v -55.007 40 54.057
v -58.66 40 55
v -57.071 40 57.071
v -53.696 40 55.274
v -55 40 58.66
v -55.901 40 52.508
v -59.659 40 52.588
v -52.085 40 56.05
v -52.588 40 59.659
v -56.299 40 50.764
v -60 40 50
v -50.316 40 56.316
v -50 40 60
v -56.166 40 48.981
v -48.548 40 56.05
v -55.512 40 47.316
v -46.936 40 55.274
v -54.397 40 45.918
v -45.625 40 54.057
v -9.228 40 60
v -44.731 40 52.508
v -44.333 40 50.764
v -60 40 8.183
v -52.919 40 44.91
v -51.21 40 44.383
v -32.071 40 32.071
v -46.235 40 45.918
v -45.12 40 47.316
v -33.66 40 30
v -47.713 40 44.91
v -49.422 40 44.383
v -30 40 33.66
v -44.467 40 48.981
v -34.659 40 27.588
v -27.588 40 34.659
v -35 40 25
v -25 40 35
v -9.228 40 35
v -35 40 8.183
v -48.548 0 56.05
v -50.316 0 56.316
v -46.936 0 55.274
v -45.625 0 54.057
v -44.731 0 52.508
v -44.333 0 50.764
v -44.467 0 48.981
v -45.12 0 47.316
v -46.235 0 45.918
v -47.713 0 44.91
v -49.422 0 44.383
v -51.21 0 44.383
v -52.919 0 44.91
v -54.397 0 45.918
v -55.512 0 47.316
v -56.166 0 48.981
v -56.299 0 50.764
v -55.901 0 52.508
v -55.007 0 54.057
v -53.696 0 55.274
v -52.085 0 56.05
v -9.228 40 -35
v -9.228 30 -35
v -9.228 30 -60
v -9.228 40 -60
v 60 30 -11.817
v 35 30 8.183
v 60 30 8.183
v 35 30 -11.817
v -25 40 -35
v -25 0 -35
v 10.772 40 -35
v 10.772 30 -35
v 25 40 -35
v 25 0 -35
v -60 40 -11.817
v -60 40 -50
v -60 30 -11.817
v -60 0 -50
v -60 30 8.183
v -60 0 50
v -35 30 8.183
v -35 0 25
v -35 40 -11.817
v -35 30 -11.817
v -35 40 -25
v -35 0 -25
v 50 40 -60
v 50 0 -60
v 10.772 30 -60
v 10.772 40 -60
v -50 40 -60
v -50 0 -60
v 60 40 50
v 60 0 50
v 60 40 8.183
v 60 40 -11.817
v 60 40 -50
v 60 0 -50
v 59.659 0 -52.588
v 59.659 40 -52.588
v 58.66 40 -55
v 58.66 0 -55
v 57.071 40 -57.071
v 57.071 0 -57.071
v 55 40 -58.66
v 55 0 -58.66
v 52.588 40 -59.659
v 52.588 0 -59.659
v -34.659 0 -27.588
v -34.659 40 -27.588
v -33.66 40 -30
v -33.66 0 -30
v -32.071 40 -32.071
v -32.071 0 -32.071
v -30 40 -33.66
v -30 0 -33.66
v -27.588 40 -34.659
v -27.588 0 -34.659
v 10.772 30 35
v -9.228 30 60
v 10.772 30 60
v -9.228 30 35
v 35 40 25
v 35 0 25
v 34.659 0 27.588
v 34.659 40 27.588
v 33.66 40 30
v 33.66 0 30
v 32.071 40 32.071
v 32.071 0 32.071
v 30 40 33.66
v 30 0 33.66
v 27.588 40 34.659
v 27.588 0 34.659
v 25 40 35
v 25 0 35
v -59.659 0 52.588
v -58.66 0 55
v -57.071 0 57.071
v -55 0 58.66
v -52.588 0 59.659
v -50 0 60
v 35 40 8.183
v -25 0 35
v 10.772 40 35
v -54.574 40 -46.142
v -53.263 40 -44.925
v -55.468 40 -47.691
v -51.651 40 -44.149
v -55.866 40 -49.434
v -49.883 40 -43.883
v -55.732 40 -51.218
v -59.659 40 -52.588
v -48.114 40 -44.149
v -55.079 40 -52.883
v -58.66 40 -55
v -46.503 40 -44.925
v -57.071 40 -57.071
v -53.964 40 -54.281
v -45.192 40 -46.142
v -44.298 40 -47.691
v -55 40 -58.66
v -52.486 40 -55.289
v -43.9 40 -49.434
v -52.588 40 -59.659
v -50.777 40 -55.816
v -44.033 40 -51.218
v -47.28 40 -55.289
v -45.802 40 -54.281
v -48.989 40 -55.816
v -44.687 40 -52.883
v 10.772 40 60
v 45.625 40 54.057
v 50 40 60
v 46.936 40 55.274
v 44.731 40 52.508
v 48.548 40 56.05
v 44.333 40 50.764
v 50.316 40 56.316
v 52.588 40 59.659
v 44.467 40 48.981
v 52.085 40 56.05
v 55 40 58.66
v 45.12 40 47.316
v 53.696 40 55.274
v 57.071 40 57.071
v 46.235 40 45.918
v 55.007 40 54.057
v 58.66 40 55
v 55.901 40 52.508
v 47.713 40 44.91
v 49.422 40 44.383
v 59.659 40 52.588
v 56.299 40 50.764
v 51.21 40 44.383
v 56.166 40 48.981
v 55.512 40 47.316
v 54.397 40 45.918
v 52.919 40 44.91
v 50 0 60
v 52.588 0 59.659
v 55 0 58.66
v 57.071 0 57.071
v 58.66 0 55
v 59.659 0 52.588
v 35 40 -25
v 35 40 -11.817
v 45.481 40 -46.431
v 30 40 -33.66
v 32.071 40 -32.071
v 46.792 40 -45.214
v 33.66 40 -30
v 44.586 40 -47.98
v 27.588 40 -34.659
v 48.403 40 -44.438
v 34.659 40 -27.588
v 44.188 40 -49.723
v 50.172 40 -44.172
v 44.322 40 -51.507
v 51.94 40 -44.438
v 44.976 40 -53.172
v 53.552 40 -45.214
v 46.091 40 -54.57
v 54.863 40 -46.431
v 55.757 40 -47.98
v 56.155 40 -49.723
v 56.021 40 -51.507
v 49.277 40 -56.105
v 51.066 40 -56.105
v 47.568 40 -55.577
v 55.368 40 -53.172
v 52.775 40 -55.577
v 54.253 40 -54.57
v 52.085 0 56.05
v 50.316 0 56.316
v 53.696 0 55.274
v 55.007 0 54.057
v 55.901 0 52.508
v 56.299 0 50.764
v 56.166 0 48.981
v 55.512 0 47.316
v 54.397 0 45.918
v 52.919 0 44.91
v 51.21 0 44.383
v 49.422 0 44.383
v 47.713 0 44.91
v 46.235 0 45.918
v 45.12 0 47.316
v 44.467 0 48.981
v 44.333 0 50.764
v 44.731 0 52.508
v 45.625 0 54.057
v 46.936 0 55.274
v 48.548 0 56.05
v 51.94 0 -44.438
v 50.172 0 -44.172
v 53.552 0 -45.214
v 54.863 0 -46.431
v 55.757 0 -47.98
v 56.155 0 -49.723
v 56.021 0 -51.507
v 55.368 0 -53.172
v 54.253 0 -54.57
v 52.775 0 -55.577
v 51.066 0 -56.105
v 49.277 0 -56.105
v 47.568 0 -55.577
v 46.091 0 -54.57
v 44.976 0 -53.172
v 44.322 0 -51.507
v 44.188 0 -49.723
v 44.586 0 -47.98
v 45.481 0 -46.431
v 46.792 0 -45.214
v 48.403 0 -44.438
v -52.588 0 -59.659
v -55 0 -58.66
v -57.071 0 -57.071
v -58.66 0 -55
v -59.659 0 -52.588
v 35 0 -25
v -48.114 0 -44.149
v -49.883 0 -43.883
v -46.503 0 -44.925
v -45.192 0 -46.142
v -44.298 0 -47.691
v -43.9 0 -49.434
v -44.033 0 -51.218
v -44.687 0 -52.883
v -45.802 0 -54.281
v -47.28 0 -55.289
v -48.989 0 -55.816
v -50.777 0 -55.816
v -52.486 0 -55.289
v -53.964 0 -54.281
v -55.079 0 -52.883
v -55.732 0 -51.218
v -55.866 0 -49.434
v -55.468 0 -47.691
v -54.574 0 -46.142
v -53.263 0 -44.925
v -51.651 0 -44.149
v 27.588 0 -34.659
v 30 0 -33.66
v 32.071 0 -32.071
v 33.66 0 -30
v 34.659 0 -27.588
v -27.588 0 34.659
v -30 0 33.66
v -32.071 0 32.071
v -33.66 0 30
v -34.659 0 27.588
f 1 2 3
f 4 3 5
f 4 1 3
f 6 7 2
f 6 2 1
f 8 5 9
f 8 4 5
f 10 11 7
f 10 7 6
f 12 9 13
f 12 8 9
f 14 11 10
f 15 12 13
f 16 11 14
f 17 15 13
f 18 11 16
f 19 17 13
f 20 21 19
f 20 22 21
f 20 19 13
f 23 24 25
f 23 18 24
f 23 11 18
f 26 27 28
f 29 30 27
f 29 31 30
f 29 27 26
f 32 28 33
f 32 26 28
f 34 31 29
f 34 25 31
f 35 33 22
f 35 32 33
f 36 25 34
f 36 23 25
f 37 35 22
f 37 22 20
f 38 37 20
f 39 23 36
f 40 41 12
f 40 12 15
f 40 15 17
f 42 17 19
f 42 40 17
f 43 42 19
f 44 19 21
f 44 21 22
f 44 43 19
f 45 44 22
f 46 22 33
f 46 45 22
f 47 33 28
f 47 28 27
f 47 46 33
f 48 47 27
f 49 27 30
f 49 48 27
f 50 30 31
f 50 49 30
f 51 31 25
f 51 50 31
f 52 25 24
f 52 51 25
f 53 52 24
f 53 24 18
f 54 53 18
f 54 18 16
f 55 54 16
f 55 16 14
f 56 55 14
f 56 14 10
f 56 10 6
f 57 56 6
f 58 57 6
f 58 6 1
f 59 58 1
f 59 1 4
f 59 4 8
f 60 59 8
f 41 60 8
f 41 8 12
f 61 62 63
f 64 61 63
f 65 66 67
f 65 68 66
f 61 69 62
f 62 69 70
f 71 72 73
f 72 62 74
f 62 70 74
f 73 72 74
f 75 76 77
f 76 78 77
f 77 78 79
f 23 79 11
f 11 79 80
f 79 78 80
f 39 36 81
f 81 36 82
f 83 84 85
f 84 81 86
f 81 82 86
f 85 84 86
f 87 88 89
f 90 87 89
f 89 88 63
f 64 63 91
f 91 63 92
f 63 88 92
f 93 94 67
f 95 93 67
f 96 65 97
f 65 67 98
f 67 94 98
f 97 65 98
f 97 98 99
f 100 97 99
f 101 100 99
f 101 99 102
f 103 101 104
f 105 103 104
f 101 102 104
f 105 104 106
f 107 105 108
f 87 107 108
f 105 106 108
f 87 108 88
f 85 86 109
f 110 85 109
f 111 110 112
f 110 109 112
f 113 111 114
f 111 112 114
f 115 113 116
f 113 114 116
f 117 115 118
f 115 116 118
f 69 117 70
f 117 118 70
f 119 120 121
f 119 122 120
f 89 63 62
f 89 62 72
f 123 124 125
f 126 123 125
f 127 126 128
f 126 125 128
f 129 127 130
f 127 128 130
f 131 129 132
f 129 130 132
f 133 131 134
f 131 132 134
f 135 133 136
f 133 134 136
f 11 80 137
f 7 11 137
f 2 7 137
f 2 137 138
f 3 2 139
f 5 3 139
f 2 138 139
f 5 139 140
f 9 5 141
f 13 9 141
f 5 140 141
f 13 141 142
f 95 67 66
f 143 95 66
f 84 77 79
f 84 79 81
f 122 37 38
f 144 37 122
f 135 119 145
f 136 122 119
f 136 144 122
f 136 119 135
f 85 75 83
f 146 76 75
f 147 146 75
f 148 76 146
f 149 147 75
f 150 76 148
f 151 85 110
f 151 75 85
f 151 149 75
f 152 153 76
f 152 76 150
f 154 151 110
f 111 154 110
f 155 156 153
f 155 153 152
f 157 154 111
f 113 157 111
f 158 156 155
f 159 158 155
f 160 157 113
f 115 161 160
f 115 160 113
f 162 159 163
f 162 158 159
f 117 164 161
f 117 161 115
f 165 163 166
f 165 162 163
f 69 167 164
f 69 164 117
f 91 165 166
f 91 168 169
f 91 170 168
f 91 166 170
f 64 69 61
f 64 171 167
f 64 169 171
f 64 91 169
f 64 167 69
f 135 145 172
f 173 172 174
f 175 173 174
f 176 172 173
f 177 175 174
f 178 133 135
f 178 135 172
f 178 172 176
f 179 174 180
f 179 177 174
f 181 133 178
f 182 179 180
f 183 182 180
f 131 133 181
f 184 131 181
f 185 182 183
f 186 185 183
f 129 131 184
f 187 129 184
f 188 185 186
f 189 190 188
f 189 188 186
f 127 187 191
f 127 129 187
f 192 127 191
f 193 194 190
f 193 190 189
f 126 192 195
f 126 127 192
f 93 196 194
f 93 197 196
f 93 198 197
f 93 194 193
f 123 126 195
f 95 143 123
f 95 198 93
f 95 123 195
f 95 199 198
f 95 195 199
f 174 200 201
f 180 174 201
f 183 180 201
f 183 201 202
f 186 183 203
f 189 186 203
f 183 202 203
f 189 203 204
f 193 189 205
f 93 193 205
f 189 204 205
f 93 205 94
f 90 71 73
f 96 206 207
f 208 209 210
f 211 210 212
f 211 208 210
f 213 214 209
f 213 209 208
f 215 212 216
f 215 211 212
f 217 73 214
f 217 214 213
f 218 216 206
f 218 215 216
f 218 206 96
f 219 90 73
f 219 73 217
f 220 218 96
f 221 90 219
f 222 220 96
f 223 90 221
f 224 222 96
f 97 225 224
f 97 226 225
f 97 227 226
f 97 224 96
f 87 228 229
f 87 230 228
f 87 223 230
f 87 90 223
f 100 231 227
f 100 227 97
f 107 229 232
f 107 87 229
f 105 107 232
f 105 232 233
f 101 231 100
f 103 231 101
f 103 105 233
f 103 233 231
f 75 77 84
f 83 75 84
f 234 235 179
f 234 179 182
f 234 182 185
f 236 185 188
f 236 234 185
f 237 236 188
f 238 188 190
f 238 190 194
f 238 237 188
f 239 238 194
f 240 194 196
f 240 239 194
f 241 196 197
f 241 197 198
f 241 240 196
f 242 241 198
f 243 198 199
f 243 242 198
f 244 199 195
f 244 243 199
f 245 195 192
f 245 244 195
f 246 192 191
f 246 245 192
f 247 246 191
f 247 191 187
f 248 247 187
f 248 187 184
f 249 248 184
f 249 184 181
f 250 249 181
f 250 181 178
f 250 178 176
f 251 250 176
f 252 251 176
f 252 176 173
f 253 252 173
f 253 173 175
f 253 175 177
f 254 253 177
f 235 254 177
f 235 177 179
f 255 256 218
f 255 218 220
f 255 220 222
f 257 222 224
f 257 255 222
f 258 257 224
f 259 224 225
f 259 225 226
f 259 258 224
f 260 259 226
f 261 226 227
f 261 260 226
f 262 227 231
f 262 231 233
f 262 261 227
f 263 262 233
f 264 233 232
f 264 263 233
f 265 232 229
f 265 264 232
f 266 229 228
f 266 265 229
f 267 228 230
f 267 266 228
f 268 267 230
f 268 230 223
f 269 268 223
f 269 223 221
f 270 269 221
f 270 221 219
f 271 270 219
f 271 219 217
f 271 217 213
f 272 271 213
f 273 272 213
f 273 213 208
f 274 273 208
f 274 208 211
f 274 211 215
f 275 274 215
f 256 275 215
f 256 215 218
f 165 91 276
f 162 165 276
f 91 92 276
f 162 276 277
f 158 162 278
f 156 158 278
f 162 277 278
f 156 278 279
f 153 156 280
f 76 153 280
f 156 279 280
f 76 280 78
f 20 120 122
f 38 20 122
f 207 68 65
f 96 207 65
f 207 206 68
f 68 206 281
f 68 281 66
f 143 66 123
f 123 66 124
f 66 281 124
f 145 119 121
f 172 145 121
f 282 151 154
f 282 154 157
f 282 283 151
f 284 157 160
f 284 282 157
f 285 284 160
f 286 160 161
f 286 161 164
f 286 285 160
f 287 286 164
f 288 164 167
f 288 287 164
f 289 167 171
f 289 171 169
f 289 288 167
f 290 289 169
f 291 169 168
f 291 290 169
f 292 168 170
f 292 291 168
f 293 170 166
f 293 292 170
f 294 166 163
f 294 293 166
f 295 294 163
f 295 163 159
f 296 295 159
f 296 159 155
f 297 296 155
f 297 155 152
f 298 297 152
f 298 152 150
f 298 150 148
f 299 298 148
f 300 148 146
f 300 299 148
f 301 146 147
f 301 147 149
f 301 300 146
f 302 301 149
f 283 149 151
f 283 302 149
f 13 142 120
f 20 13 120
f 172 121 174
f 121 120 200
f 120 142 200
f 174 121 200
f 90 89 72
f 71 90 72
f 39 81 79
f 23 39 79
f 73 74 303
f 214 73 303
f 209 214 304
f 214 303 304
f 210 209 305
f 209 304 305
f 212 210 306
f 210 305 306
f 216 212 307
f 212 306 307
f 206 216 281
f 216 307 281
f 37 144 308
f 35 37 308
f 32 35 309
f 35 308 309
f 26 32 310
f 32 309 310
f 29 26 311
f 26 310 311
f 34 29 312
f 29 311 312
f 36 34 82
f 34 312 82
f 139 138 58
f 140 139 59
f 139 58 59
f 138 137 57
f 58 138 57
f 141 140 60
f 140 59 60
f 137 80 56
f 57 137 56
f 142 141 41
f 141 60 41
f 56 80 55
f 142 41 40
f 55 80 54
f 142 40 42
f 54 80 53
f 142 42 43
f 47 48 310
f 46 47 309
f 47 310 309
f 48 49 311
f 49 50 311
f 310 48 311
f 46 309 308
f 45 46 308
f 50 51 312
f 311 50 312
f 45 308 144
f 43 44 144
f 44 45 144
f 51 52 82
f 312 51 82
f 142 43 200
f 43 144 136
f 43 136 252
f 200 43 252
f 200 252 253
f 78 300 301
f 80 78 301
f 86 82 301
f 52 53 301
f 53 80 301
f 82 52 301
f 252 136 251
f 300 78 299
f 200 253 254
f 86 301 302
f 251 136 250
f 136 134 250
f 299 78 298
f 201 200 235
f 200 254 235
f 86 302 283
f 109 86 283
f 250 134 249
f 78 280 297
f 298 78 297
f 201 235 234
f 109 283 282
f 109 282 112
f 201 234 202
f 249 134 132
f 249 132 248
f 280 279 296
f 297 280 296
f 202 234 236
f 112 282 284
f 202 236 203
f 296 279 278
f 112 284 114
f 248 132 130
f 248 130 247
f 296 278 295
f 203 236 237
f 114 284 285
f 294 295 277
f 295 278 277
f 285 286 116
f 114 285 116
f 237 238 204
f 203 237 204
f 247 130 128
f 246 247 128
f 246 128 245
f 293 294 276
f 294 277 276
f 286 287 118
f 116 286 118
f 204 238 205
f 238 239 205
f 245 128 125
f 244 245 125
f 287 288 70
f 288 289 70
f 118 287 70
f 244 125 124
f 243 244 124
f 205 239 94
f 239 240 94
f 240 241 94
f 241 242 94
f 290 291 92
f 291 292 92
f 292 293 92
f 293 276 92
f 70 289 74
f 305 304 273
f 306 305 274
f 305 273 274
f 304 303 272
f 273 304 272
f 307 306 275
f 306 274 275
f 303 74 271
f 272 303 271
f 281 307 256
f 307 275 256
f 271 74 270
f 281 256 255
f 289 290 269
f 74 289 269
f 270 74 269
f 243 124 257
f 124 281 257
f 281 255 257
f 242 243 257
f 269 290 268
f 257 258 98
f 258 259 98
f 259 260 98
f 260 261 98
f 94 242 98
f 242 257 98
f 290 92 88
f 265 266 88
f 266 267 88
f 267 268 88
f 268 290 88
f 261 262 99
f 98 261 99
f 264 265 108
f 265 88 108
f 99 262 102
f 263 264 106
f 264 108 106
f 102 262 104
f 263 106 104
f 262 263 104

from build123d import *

# Parameters (mm, degrees)
SKETCH1_R           = 6
SKETCH1_W           = 25
SKETCH1_H           = 20
SKETCH1_W_2         = 20
SKETCH1_H_2         = 25
BOSS_EXTRUDE1_DEPTH = 30
SKETCH2_R           = 6
BOSS_EXTRUDE2_DEPTH = 10


with BuildPart() as part:
    # Sketch1 → Boss-Extrude1 (new body)
    # profile 1 of 8: a face of its own
    with BuildSketch(Plane(origin=(0, 0, 0), x_dir=(1, 0, 0), z_dir=(0, 1, 0))):
        with BuildLine():
            Line((-9.676519666, -60), (-9.676519666, -35))
            Line((-9.676519666, -35), (-25, -35))
            ThreePointArc((-25, -35), (-32.071067812, -32.071067812), (-35, -25))
            Line((-35, -25), (-35, -7.678426698))
            Line((-35, -7.678426698), (-60, -7.678426698))
            Line((-60, -7.678426698), (-60, -50))
            ThreePointArc((-60, -50), (-57.071067812, -57.071067812), (-50, -60))
            Line((-50, -60), (-9.676519666, -60))
        make_face()
        with Locations(Location((-50.316110583, -50.316110583, 0), (0, 0, 270))):
            Circle(SKETCH1_R, mode=Mode.SUBTRACT)
    # profile 2 of 8: a face of its own
    with BuildSketch(Plane(origin=(0, 0, 0), x_dir=(1, 0, 0), z_dir=(0, 1, 0))):
        with BuildLine():
            Line((-60, 12.321573302), (-35, 12.321573302))
            Line((-35, 12.321573302), (-35, 25))
            ThreePointArc((-35, 25), (-32.071067812, 32.071067812), (-25, 35))
            Line((-25, 35), (-9.676519666, 35))
            Line((-9.676519666, 35), (-9.676519666, 60))
            Line((-9.676519666, 60), (-50, 60))
            ThreePointArc((-50, 60), (-57.071067812, 57.071067812), (-60, 50))
            Line((-60, 50), (-60, 12.321573302))
        make_face()
        with Locations(Location((-49.882833986, 49.882833986, 0), (0, 0, 270))):
            Circle(SKETCH1_R, mode=Mode.SUBTRACT)
    # profile 3 of 8: a face of its own
    with BuildSketch(Plane(origin=(0, 0, 0), x_dir=(1, 0, 0), z_dir=(0, 1, 0))):
        with BuildLine():
            Line((35, 25), (35, 12.321573302))
            Line((35, 12.321573302), (60, 12.321573302))
            Line((60, 12.321573302), (60, 50))
            ThreePointArc((60, 50), (57.071067812, 57.071067812), (50, 60))
            Line((50, 60), (10.323480334, 60))
            Line((10.323480334, 60), (10.323480334, 35))
            Line((10.323480334, 35), (25, 35))
            ThreePointArc((25, 35), (32.071067812, 32.071067812), (35, 25))
        make_face()
        with Locations(Location((50.17168505, 50.17168505, 0), (0, 0, 270))):
            Circle(SKETCH1_R, mode=Mode.SUBTRACT)
    # profile 4 of 8: a face of its own
    with BuildSketch(Plane(origin=(0, 0, 0), x_dir=(1, 0, 0), z_dir=(0, 1, 0))):
        with BuildLine():
            Line((25, -35), (10.323480334, -35))
            Line((10.323480334, -35), (10.323480334, -60))
            Line((10.323480334, -60), (50, -60))
            ThreePointArc((50, -60), (57.071067812, -57.071067812), (60, -50))
            Line((60, -50), (60, -7.678426698))
            Line((60, -7.678426698), (35, -7.678426698))
            Line((35, -7.678426698), (35, -25))
            ThreePointArc((35, -25), (32.071067812, -32.071067812), (25, -35))
        make_face()
        with Locations(Location((50.316110583, -50.316110583, 0), (0, 0, 270))):
            Circle(SKETCH1_R, mode=Mode.SUBTRACT)
    # profile 5 of 8: a face of its own
    with BuildSketch(Plane(origin=(0, 0, 0), x_dir=(1, 0, 0), z_dir=(0, 1, 0))):
        with Locations((-47.5, 2.321573302)):
            Rectangle(SKETCH1_W, SKETCH1_H)
    # profile 6 of 8: a face of its own
    with BuildSketch(Plane(origin=(0, 0, 0), x_dir=(1, 0, 0), z_dir=(0, 1, 0))):
        with Locations((47.5, 2.321573302)):
            Rectangle(SKETCH1_W, SKETCH1_H)
    # profile 7 of 8: a face of its own
    with BuildSketch(Plane(origin=(0, 0, 0), x_dir=(1, 0, 0), z_dir=(0, 1, 0))):
        with Locations((0.323480334, 47.5)):
            Rectangle(SKETCH1_W_2, SKETCH1_H_2)
    # profile 8 of 8: a face of its own
    with BuildSketch(Plane(origin=(0, 0, 0), x_dir=(1, 0, 0), z_dir=(0, 1, 0))):
        with Locations((0.323480334, -47.5)):
            Rectangle(SKETCH1_W_2, SKETCH1_H_2)
    extrude(amount=BOSS_EXTRUDE1_DEPTH)

    # Sketch2 → Boss-Extrude2 (add)
    # profile 1 of 4: a face of its own
    with BuildSketch(Plane(origin=(0, 30, 0), x_dir=(1, 0, 0), z_dir=(0, 1, 0))):
        with BuildLine():
            Line((-9.228273843, 35), (-9.228273843, 60))
            Line((-9.228273843, 60), (-50, 60))
            ThreePointArc((-50, 60), (-57.071067812, 57.071067812), (-60, 50))
            Line((-60, 50), (-60, 11.816725799))
            Line((-60, 11.816725799), (-35, 11.816725799))
            Line((-35, 11.816725799), (-35, 25))
            ThreePointArc((-35, 25), (-32.071067812, 32.071067812), (-25, 35))
            Line((-25, 35), (-9.228273843, 35))
        make_face()
        with Locations(Location((-49.882833986, 49.882833986, 0), (0, 0, 270))):
            Circle(SKETCH2_R, mode=Mode.SUBTRACT)
    # profile 2 of 4: a face of its own
    with BuildSketch(Plane(origin=(0, 30, 0), x_dir=(1, 0, 0), z_dir=(0, 1, 0))):
        with BuildLine():
            Line((50, 60), (10.771726157, 60))
            Line((10.771726157, 60), (10.771726157, 35))
            Line((10.771726157, 35), (25, 35))
            ThreePointArc((25, 35), (32.071067812, 32.071067812), (35, 25))
            Line((35, 25), (35, 11.816725799))
            Line((35, 11.816725799), (60, 11.816725799))
            Line((60, 11.816725799), (60, 50))
            ThreePointArc((60, 50), (57.071067812, 57.071067812), (50, 60))
        make_face()
        with Locations(Location((50.17168505, 50.17168505, 0), (0, 0, 270))):
            Circle(SKETCH2_R, mode=Mode.SUBTRACT)
    # profile 3 of 4: a face of its own
    with BuildSketch(Plane(origin=(0, 30, 0), x_dir=(1, 0, 0), z_dir=(0, 1, 0))):
        with BuildLine():
            Line((60, -50), (60, -8.183274201))
            Line((60, -8.183274201), (35, -8.183274201))
            Line((35, -8.183274201), (35, -25))
            ThreePointArc((35, -25), (32.071067812, -32.071067812), (25, -35))
            Line((25, -35), (10.771726157, -35))
            Line((10.771726157, -35), (10.771726157, -60))
            Line((10.771726157, -60), (50, -60))
            ThreePointArc((50, -60), (57.071067812, -57.071067812), (60, -50))
        make_face()
        with Locations(Location((50.316110583, -50.316110583, 0), (0, 0, 270))):
            Circle(SKETCH2_R, mode=Mode.SUBTRACT)
    # profile 4 of 4: a face of its own
    with BuildSketch(Plane(origin=(0, 30, 0), x_dir=(1, 0, 0), z_dir=(0, 1, 0))):
        with BuildLine():
            Line((-35, -8.183274201), (-60, -8.183274201))
            Line((-60, -8.183274201), (-60, -50))
            ThreePointArc((-60, -50), (-57.071067812, -57.071067812), (-50, -60))
            Line((-50, -60), (-9.228273843, -60))
            Line((-9.228273843, -60), (-9.228273843, -35))
            Line((-9.228273843, -35), (-25, -35))
            ThreePointArc((-25, -35), (-32.071067812, -32.071067812), (-35, -25))
            Line((-35, -25), (-35, -8.183274201))
        make_face()
        with Locations(Location((-50.316110583, -50.316110583, 0), (0, 0, 270))):
            Circle(SKETCH2_R, mode=Mode.SUBTRACT)
    extrude(amount=BOSS_EXTRUDE2_DEPTH)


solid = part.part
